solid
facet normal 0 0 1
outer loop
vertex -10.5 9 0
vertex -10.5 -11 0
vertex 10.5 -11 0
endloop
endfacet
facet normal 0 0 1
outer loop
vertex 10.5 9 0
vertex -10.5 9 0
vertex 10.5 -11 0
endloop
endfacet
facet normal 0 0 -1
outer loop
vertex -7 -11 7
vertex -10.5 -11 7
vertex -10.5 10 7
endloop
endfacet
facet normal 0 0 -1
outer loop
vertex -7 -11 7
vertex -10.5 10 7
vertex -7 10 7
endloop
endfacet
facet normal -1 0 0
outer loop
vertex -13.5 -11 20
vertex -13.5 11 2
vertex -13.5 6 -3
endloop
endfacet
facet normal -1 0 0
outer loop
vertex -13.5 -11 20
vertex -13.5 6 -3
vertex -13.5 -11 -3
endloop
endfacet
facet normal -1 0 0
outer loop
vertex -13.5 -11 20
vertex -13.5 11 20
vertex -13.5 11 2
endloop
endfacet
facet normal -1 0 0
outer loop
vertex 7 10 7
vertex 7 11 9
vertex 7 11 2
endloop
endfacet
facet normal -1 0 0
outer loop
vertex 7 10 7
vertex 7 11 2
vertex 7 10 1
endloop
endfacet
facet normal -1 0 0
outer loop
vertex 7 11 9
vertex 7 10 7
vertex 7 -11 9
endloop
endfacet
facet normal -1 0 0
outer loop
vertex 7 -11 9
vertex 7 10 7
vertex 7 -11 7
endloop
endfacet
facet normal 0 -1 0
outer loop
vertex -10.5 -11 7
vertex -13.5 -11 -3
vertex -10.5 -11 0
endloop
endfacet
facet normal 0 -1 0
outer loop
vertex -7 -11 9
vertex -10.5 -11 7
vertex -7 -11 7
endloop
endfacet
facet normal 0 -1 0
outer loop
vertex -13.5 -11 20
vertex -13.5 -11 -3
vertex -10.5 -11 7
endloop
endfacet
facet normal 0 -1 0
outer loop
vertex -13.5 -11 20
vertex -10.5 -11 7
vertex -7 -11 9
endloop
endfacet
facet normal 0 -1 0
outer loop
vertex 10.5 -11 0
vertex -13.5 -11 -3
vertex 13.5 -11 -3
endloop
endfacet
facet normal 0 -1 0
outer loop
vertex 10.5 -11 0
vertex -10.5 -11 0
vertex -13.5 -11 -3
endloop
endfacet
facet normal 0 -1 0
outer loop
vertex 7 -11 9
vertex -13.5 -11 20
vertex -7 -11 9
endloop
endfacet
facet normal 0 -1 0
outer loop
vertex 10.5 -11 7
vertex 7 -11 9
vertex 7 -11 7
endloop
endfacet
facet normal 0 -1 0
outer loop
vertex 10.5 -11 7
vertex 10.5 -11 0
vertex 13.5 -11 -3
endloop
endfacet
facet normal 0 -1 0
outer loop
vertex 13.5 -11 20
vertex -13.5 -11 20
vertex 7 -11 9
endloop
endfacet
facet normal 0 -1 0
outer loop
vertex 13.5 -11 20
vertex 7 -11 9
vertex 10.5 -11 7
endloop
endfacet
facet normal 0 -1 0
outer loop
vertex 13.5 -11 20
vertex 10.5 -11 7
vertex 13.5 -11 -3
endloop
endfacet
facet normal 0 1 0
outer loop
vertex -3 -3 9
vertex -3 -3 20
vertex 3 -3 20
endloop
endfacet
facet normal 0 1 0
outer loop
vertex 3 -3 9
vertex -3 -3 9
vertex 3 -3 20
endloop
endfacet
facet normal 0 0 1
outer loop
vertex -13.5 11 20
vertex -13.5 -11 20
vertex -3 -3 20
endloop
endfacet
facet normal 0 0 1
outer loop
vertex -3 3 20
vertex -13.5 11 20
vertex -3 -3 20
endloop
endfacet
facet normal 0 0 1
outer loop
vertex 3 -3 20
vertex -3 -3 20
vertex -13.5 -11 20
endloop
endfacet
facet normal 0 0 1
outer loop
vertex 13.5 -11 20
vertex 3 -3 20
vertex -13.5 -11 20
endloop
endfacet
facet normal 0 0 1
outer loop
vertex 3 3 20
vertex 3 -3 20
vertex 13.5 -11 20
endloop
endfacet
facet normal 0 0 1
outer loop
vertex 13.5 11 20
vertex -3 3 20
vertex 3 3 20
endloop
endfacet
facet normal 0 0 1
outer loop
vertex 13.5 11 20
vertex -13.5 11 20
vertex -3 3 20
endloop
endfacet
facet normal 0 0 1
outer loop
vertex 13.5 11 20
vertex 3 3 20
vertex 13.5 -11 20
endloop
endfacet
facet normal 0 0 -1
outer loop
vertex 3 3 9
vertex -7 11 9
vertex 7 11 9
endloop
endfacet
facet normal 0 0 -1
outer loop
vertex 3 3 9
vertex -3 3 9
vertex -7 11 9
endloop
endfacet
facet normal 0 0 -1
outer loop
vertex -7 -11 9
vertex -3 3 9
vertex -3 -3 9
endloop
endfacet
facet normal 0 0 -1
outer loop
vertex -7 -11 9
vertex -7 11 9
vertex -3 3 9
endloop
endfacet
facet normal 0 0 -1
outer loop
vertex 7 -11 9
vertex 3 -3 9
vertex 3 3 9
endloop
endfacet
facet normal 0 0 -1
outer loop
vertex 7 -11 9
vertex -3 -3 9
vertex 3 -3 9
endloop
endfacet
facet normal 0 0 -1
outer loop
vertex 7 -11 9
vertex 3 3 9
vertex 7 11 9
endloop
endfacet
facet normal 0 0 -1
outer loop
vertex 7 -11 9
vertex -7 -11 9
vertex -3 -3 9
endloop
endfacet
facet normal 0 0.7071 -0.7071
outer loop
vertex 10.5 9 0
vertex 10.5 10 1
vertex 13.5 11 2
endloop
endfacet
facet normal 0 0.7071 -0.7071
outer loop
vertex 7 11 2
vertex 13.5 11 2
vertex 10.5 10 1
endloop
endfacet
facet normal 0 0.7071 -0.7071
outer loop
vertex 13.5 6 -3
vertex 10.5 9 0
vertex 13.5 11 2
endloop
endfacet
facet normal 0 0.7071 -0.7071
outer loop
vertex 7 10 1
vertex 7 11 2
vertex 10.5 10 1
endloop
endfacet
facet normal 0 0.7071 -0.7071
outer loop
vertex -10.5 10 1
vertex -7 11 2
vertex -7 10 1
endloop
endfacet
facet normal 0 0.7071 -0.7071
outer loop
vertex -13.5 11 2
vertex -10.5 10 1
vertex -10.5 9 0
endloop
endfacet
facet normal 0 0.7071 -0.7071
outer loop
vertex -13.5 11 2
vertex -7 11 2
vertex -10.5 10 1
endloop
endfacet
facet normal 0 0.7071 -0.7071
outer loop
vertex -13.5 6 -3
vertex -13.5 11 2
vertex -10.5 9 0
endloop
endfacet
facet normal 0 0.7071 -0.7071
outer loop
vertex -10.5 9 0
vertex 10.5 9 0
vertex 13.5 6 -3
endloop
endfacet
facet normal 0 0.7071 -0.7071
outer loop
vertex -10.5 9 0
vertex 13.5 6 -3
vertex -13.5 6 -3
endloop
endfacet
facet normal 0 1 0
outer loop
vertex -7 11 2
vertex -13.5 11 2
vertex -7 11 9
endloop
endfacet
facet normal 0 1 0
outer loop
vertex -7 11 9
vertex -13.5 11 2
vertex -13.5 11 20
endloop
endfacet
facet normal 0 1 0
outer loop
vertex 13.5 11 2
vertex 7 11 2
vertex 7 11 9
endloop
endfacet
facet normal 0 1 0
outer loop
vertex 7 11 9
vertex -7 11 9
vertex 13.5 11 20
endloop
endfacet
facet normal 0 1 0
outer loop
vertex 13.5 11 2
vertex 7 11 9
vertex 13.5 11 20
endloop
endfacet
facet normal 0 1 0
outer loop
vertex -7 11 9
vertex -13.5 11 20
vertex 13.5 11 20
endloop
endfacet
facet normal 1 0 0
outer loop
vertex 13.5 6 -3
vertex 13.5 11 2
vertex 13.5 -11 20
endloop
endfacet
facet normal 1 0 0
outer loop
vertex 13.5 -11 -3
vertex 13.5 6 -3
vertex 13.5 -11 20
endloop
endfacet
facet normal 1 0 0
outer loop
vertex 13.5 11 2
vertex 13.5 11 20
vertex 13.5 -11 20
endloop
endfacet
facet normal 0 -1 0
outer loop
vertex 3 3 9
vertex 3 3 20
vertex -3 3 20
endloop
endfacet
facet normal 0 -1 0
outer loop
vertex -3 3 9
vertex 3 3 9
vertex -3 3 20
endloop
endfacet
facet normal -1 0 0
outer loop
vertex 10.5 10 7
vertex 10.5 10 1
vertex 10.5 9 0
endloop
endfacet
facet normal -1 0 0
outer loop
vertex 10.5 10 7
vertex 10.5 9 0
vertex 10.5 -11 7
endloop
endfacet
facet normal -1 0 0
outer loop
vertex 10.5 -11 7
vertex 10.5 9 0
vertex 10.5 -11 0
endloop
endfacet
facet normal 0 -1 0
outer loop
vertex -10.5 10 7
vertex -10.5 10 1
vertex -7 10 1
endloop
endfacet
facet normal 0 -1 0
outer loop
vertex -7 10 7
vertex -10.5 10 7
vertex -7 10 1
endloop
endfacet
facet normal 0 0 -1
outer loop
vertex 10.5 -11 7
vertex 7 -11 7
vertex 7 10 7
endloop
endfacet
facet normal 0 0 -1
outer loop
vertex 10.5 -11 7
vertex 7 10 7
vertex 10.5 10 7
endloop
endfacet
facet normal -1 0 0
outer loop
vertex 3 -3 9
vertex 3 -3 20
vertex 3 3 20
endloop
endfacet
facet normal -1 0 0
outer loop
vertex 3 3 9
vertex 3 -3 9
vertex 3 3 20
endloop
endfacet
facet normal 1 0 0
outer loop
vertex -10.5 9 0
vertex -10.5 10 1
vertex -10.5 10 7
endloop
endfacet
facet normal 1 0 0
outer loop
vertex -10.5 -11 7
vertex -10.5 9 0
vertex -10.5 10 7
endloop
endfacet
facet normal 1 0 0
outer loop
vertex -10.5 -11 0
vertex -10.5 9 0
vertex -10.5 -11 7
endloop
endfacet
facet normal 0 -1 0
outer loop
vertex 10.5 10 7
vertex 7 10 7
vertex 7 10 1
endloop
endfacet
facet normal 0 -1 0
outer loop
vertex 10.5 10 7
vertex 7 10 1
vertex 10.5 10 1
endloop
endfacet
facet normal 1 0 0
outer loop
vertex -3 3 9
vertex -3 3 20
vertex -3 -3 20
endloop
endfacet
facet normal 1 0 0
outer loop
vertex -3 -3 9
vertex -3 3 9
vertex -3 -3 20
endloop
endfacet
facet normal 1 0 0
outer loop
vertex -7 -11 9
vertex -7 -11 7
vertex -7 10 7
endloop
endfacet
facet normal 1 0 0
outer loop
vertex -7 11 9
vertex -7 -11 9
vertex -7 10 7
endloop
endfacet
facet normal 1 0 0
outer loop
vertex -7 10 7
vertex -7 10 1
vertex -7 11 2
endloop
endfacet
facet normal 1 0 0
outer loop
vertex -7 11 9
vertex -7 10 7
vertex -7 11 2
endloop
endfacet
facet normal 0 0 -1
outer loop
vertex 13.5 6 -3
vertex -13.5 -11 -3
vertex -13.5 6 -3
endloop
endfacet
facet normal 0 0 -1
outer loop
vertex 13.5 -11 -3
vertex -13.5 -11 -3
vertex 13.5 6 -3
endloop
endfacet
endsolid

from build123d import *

# Parameters (mm, degrees)
F0_W         = 27
F0_H         = 22
F1_DEPTH     = 20
F2_W         = 21
F2_H         = 21
F3_DEPTH     = 6
F5_DEPTH     = 2
F7_DEPTH     = 20
F8_DEPTH     = 6
F9_W         = 27
F9_H         = 22
F10_DEPTH    = 3
F11_T1_DEPTH = 52.7168298797
F12_DEPTH    = 1


# Not quite as in the source:
# - a fillet or chamfer that OpenCascade refuses, or shapes differently, is made with other operations: its cross-section is extruded or revolved along the edge and cut away or added


with BuildPart() as f1:
    # F0 (on Top) → F1 (new body)
    with BuildSketch(Plane.XY):
        Rectangle(F0_W, F0_H)
    extrude(amount=F1_DEPTH)

    # F2 (on face) → F3 (cut)
    with BuildSketch(Plane(origin=(0, 0, 0), x_dir=(1, 0, 0), z_dir=(0, 0, -1))):
        with Locations((0, 0.5)):
            Rectangle(F2_W, F2_H)
    extrude(amount=-F3_DEPTH, mode=Mode.SUBTRACT)

    # F4 (on face) → F5 (cut)
    with BuildSketch(Plane(origin=(0, 0, 6), x_dir=(1, 0, 0), z_dir=(0, 0, -1))):
        Polygon((0, 11), (-7, 11), (-7, -11), (7, -11), (7, 11), align=None)
    extrude(amount=-F5_DEPTH, mode=Mode.SUBTRACT)

    # F6 (on face) → F7 (cut)
    with BuildSketch(Plane.XY.offset(20)):
        Polygon((0, -3), (3, -3), (3, 3), (-3, 3), (-3, -3), align=None)
    extrude(amount=-F7_DEPTH, mode=Mode.SUBTRACT)

    # F8 (cut): a face of the model
    f8_faces = [f1.faces().sort_by_distance(p)[0] for p in [
        (0, 10.5, 6),
    ]]
    extrude(f8_faces, amount=-F8_DEPTH, mode=Mode.SUBTRACT)

    # F9 (on face) → F10 (join)
    with BuildSketch(Plane(origin=(0, 0, 0), x_dir=(1, 0, 0), z_dir=(0, 0, -1))):
        Rectangle(F9_W, F9_H)
    extrude(amount=F10_DEPTH)

    # F11: chamfer of 5 on 1 edges, made by hand

    # F11_s2 → F11_t1 (cut)
    with BuildSketch(Plane.YZ.offset(-26.3584149398)):
        Polygon((11, 2), (6, -3), (11, -3), align=None)
    extrude(amount=F11_T1_DEPTH, mode=Mode.SUBTRACT)

    # F12 (cut): faces of the model
    f12_faces = [f1.faces().sort_by_distance(p)[0] for p in [
        (8.75, -0.5, 6),
        (-6.7392319038, 0, 8),
        (-8.75, -0.5, 6),
    ]]
    extrude(f12_faces, amount=-F12_DEPTH, mode=Mode.SUBTRACT)


solid = f1.part
